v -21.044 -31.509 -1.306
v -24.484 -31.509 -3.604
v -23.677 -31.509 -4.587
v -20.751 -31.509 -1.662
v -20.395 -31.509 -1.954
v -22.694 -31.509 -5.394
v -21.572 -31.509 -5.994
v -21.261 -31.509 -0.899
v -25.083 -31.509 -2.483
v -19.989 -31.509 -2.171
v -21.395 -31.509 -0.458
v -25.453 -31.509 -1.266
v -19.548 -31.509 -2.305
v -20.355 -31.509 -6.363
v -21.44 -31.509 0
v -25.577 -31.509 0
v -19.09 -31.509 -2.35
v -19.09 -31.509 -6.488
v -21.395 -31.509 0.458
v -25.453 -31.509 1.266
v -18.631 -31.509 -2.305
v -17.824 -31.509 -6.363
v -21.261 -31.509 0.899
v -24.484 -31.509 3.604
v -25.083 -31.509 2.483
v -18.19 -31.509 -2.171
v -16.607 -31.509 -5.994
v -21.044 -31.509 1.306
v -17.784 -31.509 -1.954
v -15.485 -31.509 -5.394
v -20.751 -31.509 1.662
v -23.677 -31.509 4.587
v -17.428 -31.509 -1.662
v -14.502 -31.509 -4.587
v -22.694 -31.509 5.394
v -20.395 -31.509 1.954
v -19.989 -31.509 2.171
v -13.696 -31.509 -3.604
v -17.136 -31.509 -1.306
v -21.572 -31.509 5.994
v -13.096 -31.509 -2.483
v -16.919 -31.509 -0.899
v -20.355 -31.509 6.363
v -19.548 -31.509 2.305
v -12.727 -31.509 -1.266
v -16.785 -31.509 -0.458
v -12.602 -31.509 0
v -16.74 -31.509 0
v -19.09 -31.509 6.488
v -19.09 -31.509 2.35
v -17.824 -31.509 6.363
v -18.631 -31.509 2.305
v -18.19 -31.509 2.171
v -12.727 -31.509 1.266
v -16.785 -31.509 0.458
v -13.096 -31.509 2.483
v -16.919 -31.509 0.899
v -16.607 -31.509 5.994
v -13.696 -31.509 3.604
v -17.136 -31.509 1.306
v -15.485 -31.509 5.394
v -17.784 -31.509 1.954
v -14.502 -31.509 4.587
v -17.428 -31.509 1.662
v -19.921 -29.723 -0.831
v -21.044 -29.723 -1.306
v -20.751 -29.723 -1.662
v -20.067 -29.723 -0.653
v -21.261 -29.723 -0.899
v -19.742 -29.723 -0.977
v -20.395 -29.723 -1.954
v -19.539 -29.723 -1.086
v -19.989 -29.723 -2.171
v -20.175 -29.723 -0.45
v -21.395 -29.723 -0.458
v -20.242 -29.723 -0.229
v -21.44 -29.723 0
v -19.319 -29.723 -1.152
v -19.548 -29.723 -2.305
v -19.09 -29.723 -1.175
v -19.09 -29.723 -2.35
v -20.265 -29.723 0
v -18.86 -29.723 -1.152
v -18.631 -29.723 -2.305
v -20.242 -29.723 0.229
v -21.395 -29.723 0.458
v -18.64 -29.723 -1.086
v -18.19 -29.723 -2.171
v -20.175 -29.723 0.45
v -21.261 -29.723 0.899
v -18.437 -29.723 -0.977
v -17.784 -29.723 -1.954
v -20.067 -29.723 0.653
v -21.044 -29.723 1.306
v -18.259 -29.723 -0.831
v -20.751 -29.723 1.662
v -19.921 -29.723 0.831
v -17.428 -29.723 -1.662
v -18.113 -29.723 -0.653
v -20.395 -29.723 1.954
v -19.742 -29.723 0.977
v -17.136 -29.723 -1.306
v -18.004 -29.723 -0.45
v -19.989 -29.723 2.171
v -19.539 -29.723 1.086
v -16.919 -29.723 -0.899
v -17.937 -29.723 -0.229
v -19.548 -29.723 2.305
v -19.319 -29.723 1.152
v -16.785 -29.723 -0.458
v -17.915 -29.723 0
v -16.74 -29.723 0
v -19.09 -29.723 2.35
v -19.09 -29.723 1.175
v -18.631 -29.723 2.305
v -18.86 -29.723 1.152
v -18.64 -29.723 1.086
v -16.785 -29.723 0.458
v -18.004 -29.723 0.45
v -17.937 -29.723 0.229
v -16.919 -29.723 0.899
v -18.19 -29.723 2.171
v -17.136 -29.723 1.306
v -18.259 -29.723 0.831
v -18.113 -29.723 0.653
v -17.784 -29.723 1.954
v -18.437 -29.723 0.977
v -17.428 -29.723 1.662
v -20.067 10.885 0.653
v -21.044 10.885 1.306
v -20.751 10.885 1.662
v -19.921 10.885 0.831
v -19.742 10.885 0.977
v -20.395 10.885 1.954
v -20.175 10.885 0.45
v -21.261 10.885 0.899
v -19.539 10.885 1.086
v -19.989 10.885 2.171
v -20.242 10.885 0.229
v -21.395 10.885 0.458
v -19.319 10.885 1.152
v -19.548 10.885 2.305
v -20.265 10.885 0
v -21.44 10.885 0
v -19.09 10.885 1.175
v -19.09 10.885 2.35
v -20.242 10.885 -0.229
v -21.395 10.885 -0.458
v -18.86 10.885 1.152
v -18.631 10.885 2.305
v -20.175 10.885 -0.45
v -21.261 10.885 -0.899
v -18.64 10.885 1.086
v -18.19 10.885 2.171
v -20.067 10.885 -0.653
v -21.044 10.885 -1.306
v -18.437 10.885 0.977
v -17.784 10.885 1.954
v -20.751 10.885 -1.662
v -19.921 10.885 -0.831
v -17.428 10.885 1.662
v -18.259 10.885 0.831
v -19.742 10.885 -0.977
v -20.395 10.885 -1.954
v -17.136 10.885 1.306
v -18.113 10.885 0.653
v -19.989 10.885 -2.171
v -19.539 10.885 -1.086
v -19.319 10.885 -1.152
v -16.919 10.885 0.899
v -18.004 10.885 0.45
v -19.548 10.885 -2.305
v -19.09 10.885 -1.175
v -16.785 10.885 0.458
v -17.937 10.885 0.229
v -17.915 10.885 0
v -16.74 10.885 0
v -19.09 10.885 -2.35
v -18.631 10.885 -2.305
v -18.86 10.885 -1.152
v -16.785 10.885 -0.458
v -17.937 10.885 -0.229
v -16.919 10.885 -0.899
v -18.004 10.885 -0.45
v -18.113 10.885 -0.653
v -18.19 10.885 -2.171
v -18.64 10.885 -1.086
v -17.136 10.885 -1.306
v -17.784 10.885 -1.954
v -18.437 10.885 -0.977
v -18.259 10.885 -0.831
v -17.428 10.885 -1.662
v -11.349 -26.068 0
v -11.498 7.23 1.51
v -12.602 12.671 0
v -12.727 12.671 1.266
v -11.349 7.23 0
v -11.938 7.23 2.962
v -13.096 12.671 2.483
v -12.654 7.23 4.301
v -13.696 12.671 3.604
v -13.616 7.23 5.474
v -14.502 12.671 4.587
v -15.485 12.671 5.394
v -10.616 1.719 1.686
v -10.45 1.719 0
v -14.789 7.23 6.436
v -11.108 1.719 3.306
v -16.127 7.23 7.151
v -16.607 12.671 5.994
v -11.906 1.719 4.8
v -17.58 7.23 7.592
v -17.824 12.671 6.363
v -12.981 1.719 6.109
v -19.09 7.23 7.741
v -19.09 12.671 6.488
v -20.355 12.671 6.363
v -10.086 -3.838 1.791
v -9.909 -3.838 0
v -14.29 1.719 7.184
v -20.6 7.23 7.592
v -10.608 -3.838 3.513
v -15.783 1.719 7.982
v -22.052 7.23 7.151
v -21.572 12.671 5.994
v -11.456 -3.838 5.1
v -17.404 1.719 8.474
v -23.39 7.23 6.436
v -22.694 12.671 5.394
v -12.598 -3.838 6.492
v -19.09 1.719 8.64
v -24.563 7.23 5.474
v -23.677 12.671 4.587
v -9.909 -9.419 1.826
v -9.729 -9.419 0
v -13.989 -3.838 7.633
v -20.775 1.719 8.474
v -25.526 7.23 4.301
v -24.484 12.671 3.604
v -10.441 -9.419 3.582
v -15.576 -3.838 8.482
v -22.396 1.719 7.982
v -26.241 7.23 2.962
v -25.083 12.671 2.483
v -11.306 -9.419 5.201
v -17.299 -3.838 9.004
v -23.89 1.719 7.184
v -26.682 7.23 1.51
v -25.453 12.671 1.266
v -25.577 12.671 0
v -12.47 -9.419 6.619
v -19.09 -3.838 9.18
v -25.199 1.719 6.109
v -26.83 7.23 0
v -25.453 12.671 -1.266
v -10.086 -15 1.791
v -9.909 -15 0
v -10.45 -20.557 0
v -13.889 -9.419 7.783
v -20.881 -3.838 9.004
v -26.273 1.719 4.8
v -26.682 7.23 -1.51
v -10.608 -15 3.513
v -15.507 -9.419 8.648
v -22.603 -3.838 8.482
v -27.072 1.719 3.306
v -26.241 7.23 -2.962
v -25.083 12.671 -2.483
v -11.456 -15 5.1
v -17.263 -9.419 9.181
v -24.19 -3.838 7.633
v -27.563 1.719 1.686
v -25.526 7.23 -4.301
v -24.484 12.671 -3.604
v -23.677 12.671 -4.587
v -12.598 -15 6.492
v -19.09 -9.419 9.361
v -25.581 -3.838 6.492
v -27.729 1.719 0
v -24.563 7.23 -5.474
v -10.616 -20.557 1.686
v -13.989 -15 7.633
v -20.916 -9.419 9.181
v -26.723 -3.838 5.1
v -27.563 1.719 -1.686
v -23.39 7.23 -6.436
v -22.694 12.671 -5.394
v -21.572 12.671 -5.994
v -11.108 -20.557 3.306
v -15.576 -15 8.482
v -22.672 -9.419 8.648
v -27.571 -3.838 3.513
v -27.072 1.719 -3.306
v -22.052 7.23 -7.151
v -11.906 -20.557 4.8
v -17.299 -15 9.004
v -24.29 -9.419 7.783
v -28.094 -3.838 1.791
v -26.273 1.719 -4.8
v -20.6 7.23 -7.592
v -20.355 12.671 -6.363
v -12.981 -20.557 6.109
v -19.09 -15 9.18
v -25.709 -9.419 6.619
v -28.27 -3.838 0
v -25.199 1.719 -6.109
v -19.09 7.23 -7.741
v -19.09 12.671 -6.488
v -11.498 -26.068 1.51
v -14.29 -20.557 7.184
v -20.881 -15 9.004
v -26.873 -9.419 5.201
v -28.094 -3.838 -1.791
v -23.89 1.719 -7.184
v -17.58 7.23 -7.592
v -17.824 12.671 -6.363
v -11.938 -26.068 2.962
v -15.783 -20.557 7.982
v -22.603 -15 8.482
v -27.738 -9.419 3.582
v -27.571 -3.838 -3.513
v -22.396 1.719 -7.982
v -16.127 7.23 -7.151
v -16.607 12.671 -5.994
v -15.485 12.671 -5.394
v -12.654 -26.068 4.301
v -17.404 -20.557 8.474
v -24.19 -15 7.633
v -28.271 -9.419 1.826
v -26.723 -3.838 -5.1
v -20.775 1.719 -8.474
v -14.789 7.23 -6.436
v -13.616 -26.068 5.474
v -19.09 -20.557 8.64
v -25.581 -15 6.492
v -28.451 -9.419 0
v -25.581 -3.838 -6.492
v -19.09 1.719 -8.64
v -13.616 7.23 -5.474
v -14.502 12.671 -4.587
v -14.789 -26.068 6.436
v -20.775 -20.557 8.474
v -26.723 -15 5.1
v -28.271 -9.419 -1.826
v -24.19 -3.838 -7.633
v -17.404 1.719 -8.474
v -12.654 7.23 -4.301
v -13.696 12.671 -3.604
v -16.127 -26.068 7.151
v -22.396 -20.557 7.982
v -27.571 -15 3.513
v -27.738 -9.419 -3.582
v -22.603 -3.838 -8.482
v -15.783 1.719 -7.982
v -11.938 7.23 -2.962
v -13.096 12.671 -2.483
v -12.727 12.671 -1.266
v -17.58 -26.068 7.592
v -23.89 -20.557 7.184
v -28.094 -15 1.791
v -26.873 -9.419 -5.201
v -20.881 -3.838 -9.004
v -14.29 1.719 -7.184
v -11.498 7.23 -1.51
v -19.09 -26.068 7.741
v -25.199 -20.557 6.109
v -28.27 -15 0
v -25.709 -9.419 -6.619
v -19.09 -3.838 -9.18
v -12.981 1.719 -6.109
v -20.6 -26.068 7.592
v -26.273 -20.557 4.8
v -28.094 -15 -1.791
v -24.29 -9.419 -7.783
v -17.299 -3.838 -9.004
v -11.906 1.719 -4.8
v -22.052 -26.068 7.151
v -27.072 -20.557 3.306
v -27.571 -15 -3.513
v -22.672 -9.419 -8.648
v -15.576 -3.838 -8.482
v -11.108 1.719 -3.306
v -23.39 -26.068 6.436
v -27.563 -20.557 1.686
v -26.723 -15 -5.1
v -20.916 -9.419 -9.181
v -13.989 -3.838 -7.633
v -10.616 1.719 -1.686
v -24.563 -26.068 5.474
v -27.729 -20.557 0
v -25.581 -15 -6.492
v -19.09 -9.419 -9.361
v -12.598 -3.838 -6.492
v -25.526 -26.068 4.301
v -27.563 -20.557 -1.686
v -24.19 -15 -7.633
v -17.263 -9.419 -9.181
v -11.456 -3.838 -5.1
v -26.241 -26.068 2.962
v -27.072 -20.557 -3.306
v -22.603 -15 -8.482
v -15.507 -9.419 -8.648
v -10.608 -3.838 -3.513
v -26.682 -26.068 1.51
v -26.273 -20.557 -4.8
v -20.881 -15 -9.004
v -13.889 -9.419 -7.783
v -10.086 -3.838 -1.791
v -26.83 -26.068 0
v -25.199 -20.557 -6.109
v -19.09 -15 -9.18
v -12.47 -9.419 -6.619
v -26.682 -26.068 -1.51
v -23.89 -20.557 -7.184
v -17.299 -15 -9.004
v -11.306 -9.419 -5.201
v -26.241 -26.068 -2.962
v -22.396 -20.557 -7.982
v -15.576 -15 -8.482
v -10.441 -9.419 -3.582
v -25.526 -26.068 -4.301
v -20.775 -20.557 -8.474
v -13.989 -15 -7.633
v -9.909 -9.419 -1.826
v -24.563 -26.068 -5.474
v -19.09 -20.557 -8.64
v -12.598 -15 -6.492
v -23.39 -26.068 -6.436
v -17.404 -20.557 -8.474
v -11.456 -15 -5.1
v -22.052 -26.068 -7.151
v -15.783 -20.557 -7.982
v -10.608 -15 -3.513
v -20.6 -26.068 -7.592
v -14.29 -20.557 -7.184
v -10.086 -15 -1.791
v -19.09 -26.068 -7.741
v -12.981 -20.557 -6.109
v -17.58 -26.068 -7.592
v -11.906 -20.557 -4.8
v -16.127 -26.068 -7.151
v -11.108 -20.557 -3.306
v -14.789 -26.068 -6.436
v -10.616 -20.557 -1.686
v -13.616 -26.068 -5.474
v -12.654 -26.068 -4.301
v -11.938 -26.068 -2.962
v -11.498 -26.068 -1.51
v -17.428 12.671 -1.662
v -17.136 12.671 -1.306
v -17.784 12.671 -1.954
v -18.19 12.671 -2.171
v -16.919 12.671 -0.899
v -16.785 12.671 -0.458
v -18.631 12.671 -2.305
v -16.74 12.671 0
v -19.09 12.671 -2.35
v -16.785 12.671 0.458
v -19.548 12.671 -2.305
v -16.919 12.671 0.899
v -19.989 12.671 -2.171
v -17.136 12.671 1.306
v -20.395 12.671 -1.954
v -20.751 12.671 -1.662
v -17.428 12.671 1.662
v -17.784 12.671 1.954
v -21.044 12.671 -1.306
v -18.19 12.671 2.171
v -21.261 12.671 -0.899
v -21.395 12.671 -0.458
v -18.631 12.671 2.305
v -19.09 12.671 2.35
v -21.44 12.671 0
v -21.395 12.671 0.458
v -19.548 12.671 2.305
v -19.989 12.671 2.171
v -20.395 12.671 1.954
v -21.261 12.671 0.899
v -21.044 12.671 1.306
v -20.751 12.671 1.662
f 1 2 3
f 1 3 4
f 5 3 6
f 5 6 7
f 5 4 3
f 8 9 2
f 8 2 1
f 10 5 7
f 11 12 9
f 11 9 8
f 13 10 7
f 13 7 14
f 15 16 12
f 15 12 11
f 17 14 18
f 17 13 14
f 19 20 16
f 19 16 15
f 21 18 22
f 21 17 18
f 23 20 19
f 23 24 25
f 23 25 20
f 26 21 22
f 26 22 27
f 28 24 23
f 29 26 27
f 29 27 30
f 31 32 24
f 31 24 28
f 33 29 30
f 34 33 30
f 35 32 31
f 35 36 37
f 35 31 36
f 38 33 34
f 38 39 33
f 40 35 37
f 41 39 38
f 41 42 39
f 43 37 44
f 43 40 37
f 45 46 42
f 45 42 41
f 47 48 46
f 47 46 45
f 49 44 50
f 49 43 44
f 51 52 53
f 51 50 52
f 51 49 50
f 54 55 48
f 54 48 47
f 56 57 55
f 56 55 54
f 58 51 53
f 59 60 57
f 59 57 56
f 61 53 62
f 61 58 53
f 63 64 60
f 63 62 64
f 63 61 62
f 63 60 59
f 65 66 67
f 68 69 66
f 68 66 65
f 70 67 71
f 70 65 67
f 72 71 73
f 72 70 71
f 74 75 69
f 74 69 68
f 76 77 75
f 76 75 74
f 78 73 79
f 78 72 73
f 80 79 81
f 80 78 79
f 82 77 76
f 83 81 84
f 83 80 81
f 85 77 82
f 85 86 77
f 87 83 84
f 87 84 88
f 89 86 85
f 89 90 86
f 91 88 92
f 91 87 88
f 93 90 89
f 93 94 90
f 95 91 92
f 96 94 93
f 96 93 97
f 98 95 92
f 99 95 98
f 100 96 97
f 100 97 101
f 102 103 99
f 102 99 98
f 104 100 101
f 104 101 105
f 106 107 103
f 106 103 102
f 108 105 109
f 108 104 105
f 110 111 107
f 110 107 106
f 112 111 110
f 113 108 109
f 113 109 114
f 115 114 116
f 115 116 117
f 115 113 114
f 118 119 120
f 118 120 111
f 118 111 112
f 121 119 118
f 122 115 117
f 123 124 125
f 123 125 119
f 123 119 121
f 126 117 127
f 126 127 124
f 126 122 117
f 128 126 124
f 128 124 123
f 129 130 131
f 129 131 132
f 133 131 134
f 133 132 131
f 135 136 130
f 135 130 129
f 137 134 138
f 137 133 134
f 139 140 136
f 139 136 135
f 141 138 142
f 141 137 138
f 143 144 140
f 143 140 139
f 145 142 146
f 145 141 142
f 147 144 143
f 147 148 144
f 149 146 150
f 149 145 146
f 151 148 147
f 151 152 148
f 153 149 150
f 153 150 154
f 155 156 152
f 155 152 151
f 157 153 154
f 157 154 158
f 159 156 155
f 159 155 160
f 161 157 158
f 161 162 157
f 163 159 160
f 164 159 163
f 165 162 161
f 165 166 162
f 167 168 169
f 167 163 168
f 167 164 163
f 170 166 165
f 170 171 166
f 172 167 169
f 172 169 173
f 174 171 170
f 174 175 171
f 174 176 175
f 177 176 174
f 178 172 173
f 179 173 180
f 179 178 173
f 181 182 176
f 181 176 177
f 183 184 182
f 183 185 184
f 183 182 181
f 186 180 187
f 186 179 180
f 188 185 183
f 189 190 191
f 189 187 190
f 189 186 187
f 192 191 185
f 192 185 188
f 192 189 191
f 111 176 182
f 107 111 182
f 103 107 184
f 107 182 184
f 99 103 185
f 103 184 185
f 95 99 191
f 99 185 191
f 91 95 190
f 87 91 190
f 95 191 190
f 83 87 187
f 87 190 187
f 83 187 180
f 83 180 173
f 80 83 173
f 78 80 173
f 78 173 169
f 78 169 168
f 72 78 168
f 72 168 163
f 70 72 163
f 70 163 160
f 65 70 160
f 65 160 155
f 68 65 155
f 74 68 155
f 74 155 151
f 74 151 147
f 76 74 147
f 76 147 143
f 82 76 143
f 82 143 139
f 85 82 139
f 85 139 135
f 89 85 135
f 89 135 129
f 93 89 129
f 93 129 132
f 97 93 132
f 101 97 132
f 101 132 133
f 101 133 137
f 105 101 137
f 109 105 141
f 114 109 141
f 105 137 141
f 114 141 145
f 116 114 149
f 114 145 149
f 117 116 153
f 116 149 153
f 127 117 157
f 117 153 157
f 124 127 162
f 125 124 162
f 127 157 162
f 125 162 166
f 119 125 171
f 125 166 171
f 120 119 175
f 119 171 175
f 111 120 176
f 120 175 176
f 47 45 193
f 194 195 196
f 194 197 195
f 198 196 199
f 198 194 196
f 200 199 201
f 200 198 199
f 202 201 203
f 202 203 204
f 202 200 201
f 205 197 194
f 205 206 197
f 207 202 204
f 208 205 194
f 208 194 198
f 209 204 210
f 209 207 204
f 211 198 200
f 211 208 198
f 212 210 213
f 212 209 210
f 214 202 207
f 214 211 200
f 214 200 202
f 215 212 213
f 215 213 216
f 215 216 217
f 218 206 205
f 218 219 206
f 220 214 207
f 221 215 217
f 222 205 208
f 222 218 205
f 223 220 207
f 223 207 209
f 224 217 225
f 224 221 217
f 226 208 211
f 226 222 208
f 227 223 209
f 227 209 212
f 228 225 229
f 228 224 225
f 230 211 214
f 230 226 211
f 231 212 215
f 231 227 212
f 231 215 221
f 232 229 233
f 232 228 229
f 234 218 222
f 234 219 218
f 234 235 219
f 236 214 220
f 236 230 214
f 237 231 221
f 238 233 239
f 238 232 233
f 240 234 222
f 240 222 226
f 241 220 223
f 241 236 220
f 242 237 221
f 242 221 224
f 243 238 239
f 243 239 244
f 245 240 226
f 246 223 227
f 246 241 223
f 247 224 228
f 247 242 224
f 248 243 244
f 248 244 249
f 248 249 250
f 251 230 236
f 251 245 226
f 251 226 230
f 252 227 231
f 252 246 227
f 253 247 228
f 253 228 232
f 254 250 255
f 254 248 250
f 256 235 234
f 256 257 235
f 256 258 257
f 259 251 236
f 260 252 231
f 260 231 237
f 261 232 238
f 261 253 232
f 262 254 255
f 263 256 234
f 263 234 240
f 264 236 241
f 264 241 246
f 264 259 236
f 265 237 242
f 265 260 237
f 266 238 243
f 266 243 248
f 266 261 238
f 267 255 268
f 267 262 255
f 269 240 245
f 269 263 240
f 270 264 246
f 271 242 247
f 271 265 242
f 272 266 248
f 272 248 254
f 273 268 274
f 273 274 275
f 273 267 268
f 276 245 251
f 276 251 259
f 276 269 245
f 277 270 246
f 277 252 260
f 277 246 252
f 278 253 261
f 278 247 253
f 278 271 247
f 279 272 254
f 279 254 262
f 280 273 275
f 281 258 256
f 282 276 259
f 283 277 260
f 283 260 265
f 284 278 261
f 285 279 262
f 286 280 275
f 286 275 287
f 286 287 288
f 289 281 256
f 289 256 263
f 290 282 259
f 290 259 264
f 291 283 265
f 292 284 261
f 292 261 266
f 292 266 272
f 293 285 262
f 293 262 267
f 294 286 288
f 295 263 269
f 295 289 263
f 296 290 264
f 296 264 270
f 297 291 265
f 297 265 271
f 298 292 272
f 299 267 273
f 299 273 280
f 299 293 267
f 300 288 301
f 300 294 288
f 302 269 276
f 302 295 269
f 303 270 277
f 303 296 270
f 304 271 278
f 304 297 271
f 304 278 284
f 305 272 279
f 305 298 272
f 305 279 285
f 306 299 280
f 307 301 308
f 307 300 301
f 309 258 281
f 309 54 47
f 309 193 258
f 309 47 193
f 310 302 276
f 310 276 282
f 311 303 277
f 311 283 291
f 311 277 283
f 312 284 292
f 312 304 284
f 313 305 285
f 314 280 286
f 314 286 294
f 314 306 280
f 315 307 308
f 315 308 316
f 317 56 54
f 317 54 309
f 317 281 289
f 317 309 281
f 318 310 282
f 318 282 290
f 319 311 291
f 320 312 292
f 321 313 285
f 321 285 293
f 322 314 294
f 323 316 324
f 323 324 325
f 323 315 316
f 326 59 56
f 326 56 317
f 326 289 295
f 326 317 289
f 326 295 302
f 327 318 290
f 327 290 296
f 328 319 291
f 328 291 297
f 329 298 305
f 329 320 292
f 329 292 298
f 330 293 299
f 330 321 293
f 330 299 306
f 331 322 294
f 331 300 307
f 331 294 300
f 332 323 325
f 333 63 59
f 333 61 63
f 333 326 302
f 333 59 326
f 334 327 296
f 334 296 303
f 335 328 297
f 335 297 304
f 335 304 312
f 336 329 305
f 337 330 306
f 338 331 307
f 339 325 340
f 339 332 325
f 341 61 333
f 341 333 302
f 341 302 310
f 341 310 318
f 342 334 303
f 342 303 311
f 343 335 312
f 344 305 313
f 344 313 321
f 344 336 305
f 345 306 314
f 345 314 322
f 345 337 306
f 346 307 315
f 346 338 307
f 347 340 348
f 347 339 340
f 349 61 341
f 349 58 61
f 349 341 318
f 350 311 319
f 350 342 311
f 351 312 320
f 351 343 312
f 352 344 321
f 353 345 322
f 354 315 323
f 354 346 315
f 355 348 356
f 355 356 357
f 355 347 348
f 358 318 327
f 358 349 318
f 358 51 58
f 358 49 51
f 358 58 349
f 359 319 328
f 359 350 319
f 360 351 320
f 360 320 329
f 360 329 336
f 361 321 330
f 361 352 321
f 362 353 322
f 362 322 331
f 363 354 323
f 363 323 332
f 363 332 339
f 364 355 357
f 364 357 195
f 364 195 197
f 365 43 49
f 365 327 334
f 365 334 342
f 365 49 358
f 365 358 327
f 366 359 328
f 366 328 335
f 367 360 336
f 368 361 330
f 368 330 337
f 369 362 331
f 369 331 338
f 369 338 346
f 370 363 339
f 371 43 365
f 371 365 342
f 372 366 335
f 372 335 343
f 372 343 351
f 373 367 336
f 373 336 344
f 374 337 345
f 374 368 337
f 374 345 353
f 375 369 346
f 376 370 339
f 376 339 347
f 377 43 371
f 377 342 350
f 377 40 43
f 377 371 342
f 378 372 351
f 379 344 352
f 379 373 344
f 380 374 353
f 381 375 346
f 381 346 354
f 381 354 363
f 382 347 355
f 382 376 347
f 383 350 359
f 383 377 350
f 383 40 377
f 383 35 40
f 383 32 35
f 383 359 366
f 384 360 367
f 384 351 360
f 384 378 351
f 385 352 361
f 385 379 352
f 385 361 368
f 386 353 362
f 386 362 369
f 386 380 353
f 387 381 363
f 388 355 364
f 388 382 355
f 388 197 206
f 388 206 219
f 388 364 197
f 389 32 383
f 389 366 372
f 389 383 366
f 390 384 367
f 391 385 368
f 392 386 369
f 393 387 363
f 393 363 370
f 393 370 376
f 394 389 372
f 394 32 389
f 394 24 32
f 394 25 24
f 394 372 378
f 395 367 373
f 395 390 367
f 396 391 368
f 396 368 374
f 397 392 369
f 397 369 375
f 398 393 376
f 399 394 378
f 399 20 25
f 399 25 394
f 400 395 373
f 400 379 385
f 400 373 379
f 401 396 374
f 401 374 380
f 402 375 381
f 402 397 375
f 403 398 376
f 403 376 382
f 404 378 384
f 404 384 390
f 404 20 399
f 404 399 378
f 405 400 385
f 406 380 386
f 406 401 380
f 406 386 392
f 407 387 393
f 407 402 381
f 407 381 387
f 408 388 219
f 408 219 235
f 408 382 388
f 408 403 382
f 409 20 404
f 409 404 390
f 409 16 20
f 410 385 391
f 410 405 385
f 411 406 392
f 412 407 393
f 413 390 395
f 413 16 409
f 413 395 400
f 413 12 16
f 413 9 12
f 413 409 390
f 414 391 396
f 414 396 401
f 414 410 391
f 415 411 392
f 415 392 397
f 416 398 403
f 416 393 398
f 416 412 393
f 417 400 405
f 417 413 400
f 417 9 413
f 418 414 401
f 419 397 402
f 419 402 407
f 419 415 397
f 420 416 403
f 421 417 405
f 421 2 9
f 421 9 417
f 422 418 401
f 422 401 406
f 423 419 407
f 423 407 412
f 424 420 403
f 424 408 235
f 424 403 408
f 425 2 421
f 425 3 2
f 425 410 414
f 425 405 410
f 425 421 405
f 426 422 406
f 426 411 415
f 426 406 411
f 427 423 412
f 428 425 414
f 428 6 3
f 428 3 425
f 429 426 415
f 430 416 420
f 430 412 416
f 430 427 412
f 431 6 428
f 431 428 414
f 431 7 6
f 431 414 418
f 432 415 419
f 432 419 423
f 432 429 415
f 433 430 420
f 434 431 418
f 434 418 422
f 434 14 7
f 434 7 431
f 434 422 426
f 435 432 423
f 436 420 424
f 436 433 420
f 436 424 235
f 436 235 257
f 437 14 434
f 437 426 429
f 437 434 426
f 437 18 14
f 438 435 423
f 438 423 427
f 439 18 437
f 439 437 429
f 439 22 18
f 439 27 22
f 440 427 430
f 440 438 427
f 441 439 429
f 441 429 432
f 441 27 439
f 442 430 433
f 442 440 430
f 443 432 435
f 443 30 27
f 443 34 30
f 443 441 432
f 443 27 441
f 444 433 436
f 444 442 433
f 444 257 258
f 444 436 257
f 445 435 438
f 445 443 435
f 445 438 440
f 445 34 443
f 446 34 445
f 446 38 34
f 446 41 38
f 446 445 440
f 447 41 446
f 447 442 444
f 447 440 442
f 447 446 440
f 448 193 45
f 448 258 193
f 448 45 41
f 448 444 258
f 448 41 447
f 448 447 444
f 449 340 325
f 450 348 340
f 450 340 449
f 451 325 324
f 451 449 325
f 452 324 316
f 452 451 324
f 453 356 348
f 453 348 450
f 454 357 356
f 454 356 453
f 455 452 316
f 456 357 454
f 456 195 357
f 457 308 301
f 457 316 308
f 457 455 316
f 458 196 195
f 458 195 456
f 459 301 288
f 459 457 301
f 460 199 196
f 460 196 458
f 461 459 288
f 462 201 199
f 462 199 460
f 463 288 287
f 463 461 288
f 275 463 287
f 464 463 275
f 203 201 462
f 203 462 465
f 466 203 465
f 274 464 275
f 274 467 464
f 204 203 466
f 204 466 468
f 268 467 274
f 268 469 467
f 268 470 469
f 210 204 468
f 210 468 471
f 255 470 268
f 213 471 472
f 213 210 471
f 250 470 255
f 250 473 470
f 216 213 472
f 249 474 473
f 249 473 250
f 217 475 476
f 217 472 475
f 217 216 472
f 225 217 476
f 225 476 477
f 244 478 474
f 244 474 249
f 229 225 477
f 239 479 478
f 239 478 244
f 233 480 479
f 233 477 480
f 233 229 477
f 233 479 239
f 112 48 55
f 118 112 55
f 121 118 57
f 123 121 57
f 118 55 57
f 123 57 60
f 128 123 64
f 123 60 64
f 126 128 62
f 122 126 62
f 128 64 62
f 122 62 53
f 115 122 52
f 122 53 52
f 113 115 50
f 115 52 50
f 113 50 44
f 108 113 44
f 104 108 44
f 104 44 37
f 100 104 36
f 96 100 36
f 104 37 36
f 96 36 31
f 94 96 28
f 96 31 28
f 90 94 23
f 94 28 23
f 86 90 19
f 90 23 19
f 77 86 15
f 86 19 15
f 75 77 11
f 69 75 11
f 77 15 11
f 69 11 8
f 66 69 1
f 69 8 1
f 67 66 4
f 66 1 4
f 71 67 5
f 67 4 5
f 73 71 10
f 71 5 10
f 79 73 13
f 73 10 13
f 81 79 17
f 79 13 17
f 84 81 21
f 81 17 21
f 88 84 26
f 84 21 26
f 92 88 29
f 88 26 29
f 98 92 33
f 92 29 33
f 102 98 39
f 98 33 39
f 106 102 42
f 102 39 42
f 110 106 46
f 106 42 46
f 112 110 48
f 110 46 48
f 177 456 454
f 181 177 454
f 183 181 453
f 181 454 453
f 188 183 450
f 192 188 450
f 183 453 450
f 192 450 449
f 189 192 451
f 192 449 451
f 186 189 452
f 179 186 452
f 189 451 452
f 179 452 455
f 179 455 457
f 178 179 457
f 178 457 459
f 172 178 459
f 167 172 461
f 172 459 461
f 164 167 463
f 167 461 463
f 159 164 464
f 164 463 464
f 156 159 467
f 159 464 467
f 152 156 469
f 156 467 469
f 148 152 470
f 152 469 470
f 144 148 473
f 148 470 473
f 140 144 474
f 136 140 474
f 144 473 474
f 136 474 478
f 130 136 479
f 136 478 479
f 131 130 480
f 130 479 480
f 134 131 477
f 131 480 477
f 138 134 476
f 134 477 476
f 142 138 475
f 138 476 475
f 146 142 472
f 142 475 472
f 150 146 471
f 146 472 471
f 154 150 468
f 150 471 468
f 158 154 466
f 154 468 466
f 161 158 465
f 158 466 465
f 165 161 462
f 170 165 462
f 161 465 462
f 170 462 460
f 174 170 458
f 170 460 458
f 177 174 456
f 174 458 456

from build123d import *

# Parameters (mm, degrees)
SKETCH7_R          = 1.25
CUT_EXTRUDE6_DEPTH = 48.0000001
SKETCH8_R          = 2.5
CUT_EXTRUDE7_DEPTH = 1.9
SKETCH9_R          = 2.5
CUT_EXTRUDE8_DEPTH = 1.9
SCALE1_SCALE       = 0.95
SCALE2_SCALE       = 1.052631579
SCALE3_SCALE       = 0.94


with BuildPart() as part:
    # Sketch4 → Revolve2 (revolve)
    with BuildSketch(Plane.XY):
        with BuildLine():
            ThreePointArc((-12.188062192, 14.080894234), (-9.13116282, -9.419105766), (-12.188062192, -32.919105766))
            Line((-12.188062192, -32.919105766), (-19.089678679, -32.919105766))
            Line((-19.089678679, -32.919105766), (-19.089678679, 14.080894234))
            Line((-19.089678679, 14.080894234), (-12.188062192, 14.080894234))
        make_face()
    revolve(axis=Axis((-19.089678679, 14.080894234, 0), (0, -1, 0)))

    # Sketch7 → Cut-Extrude6 (cut, through all)
    with BuildSketch(Plane(origin=(0, 14.080894234, 0), x_dir=(1, 0, 0), z_dir=(0, 1, 0))):
        with Locations((-19.089678679, 0)):
            Circle(SKETCH7_R)
    extrude(amount=-CUT_EXTRUDE6_DEPTH, mode=Mode.SUBTRACT)

    # Sketch8 → Cut-Extrude7 (cut)
    with BuildSketch(Plane.XZ.offset(32.919105766)):
        with Locations((-19.089678679, 0)):
            Circle(SKETCH8_R)
    extrude(amount=-CUT_EXTRUDE7_DEPTH, mode=Mode.SUBTRACT)

    # Sketch9 → Cut-Extrude8 (cut)
    with BuildSketch(Plane(origin=(0, 14.080894234, 0), x_dir=(1, 0, 0), z_dir=(0, 1, 0))):
        with Locations((-19.089678679, 0)):
            Circle(SKETCH9_R)
    extrude(amount=-CUT_EXTRUDE8_DEPTH, mode=Mode.SUBTRACT)


with BuildPart() as part_1:
    # Scale1: scaled about (-19.089678679, -9.419105766, 0)
    add(part.part.scale(SCALE1_SCALE).moved(Location((-0.954483934, -0.470955288, 0))))


with BuildPart() as part_2:
    # Scale2: scaled about (-19.089678679, -9.419105766, 0)
    add(part_1.part.scale(SCALE2_SCALE).moved(Location((1.00471993, 0.495742409, 0))))


with BuildPart() as part_3:
    # Scale3: scaled about (-19.089678679, -9.419105766, 0)
    add(part_2.part.scale(SCALE3_SCALE).moved(Location((-1.145380721, -0.565146346, 0))))


solid = part_3.part
